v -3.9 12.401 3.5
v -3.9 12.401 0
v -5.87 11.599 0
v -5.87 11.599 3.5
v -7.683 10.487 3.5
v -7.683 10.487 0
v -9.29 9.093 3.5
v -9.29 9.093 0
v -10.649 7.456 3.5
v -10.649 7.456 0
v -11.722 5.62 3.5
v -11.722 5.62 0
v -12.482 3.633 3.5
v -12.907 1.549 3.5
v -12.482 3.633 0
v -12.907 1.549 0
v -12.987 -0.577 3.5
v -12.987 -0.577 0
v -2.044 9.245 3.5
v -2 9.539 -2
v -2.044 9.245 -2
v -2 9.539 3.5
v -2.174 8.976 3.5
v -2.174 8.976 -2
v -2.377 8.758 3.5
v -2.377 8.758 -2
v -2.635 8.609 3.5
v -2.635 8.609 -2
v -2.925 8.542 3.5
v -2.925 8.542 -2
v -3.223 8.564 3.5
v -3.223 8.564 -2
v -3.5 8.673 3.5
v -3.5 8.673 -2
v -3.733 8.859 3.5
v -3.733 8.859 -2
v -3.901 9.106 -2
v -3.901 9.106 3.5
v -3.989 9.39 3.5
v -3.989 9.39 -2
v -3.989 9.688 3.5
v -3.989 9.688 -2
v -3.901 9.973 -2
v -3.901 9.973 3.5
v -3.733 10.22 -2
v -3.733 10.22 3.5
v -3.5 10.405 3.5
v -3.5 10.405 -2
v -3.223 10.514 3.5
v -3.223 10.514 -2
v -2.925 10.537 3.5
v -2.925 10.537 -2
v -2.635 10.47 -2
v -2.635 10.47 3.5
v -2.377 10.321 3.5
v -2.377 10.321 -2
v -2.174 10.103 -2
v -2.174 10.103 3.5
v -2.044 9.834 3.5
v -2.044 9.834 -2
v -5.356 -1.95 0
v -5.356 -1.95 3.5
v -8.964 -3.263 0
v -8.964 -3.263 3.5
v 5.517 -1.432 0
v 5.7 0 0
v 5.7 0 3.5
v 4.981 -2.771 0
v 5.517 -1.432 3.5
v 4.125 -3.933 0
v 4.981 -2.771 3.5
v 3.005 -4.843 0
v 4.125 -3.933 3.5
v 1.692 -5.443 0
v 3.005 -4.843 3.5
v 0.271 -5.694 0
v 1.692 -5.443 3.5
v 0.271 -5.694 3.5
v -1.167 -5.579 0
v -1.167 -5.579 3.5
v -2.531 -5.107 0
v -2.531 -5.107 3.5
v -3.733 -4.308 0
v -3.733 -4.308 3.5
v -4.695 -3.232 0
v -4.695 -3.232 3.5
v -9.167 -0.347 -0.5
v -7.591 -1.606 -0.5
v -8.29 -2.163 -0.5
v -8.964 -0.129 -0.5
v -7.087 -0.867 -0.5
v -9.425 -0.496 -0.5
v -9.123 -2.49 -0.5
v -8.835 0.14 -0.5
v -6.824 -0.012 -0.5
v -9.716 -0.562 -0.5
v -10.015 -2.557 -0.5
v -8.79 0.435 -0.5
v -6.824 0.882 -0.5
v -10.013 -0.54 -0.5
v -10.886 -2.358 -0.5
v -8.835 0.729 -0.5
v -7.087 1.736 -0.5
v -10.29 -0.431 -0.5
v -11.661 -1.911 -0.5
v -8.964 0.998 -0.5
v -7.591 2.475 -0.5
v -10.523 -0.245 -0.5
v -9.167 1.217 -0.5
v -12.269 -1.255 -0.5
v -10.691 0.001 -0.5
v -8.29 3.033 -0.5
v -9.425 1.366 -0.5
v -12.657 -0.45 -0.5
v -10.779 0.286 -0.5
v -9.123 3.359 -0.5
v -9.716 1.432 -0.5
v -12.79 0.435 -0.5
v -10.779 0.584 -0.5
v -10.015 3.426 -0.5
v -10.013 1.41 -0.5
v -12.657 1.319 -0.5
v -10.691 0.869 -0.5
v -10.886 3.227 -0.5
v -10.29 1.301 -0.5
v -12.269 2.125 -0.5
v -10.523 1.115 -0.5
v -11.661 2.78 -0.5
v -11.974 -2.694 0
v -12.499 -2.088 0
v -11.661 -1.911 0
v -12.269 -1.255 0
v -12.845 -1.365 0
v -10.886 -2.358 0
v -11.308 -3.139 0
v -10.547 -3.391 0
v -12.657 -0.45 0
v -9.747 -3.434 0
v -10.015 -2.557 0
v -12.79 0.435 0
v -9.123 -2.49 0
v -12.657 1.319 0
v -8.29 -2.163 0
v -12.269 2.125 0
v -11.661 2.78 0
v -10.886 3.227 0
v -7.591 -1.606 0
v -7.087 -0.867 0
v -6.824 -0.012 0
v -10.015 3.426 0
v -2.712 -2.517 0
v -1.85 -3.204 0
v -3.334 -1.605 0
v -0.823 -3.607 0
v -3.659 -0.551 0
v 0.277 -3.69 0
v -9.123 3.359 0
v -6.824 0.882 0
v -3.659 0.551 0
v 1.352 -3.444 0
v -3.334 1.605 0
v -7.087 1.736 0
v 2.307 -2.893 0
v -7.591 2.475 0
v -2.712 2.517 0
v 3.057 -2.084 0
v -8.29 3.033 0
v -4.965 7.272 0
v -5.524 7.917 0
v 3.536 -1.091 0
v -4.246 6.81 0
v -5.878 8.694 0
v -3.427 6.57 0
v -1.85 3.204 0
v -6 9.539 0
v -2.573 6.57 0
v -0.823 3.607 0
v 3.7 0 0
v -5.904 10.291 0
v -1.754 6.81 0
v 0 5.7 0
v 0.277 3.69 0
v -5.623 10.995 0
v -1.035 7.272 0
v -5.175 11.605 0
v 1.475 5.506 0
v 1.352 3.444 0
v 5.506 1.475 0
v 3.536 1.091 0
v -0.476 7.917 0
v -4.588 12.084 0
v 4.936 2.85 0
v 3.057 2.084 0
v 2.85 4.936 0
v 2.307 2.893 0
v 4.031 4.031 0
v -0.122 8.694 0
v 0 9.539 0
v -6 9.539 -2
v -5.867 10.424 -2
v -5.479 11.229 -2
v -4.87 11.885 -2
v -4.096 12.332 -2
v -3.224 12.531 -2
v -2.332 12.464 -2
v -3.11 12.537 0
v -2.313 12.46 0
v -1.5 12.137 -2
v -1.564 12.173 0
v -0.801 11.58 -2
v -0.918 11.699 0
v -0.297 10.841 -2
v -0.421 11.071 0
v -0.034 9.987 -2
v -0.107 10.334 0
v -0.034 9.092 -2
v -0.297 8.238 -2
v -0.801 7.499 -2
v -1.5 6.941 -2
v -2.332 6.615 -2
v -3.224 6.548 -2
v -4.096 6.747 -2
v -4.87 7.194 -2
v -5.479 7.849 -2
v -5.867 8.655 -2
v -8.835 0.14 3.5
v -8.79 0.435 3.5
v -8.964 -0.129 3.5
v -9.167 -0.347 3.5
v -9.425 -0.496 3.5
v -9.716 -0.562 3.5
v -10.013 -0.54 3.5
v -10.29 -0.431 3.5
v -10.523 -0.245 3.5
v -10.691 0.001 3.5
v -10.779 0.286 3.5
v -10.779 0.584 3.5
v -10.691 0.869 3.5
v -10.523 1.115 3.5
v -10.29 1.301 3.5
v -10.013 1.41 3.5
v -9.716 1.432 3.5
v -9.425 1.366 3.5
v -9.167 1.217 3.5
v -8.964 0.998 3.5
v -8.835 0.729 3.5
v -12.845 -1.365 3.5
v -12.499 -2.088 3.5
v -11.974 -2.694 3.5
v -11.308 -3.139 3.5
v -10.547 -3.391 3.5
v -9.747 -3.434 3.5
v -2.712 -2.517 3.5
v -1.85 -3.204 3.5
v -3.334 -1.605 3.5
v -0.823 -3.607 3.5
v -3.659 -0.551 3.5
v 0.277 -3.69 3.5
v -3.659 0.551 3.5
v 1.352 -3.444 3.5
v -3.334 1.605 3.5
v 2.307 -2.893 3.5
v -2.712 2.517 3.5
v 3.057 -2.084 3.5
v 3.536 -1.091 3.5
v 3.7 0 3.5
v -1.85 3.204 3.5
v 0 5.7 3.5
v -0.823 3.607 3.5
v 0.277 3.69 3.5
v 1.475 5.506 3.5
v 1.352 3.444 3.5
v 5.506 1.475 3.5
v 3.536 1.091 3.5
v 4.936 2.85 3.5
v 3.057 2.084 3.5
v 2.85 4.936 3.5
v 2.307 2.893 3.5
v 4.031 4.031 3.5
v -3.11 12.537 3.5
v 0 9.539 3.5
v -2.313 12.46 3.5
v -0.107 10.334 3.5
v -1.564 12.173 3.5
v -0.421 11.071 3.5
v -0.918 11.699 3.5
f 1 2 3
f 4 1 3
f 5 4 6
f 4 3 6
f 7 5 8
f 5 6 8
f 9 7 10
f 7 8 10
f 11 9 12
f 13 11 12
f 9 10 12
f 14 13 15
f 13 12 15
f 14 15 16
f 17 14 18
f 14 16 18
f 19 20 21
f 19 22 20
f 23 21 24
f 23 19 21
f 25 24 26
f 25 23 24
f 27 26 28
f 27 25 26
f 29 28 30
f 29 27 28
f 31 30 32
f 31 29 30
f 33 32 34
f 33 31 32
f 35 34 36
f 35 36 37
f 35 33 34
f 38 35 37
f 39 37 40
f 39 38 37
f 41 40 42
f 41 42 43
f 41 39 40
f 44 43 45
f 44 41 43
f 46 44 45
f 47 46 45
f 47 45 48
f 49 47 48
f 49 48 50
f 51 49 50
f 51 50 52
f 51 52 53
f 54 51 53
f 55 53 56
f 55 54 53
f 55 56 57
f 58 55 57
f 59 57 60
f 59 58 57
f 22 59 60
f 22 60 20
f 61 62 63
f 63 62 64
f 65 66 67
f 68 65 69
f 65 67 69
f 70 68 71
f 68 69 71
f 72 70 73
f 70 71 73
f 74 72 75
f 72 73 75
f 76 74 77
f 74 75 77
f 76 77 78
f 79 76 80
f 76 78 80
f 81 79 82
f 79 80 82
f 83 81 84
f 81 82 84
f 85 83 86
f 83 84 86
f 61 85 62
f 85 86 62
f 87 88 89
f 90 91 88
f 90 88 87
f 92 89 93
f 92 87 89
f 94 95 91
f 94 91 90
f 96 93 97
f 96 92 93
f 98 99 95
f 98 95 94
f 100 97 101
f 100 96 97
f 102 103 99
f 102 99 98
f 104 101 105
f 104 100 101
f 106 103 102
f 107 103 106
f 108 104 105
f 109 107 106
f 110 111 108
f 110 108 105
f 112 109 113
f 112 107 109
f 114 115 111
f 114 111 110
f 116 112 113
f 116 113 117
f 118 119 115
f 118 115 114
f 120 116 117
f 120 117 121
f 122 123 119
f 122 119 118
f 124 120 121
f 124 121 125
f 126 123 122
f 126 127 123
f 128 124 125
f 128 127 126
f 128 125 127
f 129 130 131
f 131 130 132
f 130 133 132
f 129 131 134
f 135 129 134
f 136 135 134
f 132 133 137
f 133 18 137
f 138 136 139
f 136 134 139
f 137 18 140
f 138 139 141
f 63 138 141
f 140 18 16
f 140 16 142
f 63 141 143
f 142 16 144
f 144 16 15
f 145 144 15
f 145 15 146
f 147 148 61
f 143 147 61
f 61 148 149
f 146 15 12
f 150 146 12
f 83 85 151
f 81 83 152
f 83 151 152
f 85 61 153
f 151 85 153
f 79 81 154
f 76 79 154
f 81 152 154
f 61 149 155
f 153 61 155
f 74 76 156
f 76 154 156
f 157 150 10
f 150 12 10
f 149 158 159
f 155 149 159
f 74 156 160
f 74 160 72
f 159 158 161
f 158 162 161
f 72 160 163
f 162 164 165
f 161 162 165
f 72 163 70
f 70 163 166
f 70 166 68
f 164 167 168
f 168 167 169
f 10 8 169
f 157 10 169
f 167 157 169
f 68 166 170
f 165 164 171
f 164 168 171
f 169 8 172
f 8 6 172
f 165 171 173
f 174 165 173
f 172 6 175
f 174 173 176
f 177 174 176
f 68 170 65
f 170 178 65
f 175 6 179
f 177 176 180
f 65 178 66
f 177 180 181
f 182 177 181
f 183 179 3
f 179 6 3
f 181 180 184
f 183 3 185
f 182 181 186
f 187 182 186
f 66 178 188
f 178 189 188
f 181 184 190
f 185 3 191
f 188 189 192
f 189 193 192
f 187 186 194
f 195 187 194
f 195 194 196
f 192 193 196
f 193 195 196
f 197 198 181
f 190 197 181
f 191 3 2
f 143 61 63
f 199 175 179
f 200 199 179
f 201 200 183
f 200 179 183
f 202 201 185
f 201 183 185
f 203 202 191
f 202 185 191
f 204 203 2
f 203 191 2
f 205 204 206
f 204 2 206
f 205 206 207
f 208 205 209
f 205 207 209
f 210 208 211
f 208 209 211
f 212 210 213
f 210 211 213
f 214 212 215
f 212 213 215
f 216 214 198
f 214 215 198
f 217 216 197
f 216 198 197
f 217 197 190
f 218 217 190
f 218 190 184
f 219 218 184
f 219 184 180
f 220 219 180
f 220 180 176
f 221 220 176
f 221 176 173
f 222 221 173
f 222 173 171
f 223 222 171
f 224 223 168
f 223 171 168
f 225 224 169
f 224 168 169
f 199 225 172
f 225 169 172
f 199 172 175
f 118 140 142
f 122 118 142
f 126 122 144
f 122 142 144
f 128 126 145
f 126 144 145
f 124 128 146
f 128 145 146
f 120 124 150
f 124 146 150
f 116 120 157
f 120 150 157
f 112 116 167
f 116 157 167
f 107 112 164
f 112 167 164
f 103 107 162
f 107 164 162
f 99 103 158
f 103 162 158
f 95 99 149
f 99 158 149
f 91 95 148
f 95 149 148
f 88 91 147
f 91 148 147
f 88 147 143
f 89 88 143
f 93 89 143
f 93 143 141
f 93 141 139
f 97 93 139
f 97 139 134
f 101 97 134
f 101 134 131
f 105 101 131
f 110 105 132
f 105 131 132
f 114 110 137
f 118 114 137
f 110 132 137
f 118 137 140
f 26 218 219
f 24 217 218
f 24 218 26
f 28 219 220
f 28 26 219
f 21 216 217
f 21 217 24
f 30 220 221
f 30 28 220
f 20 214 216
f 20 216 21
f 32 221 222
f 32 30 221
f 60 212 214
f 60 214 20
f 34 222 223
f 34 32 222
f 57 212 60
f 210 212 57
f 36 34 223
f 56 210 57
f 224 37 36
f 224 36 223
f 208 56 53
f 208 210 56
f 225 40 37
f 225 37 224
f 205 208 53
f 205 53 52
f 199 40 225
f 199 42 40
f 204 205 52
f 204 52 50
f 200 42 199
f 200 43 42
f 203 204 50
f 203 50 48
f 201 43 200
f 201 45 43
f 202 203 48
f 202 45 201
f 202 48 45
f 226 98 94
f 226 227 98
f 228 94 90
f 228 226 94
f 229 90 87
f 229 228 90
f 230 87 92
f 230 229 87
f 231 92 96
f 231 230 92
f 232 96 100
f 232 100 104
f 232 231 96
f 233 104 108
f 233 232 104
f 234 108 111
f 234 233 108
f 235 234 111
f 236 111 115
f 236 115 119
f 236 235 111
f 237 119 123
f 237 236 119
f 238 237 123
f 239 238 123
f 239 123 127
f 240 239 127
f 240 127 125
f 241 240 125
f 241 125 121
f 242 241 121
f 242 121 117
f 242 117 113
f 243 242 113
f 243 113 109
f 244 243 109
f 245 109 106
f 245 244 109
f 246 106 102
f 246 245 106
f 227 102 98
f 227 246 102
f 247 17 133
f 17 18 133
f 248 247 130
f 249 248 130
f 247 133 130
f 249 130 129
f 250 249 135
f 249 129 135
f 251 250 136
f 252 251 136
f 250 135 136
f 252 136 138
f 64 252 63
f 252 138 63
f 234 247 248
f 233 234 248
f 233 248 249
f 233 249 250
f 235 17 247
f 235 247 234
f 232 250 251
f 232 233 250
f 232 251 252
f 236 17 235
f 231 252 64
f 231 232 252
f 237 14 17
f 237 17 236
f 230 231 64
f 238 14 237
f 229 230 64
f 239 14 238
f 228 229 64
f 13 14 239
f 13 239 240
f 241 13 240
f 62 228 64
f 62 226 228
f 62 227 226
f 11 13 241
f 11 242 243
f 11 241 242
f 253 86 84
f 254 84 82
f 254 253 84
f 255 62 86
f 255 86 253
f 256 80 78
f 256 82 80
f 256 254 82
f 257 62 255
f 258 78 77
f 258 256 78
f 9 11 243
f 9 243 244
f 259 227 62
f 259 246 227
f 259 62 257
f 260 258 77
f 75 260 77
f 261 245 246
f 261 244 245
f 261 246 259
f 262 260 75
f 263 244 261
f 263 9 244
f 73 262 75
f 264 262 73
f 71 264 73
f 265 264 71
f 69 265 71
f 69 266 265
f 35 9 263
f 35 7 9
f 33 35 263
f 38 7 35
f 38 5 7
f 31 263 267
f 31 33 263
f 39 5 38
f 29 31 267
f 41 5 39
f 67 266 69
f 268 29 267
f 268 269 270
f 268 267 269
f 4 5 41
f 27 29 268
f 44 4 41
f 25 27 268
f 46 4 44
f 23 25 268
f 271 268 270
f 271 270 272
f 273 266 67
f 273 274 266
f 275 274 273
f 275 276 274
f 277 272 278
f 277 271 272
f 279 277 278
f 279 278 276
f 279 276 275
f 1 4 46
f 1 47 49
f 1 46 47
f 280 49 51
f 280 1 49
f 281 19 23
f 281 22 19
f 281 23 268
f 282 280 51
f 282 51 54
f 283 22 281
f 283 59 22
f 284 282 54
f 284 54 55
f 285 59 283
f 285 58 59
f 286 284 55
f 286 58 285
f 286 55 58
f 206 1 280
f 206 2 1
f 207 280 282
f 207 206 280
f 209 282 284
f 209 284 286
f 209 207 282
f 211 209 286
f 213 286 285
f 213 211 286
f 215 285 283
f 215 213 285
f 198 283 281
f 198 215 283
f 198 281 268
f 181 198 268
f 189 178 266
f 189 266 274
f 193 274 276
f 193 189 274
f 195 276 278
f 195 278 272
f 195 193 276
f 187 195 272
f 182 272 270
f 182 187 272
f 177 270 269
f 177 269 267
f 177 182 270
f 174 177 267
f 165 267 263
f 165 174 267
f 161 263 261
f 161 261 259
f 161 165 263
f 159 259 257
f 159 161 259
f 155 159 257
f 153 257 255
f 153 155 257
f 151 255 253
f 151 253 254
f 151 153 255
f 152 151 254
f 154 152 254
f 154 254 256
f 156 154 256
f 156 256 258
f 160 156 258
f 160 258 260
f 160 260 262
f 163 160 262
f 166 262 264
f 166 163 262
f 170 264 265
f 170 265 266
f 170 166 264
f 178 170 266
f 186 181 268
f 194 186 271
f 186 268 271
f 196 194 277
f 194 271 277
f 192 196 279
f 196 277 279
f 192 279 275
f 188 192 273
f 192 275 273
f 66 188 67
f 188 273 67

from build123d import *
from build123d.topology import SkipClean

# Parameters (mm, degrees)
SKETCH1_R           = 13
SKETCH1_R_2         = 3.7
BOSS_EXTRUDE1_DEPTH = 3.5
CUT_EXTRUDE1_START  = -10
CUT_EXTRUDE1_DEPTH  = 10
SKETCH3_R           = 1
CUT_EXTRUDE2_DEPTH  = 10
SKETCH5_R           = 1
CUT_EXTRUDE3_DEPTH  = 6
FILLET1_R           = 3
SKETCH6_R           = 3
SKETCH6_R_2         = 1
BOSS_EXTRUDE2_DEPTH = 0.5
SKETCH6_3_R         = 3
SKETCH6_3_R_2       = 1
BOSS_EXTRUDE3_DEPTH = 2


with BuildPart() as part:
    # Sketch1 → Boss-Extrude1 (new body)
    with BuildSketch(Plane.XY):
        Circle(SKETCH1_R)
        Circle(SKETCH1_R_2, mode=Mode.SUBTRACT)
    extrude(amount=BOSS_EXTRUDE1_DEPTH)

    # Sketch2 → Cut-Extrude1 (cut)
    with BuildSketch(Plane.XY.offset(3.5).offset(CUT_EXTRUDE1_START)):
        with BuildLine():
            ThreePointArc((5.7, 0), (0.989794613, -5.613404192), (-5.356247938, -1.949514817))
            Line((-5.356247938, -1.949514817), (-12.21600407, -4.446261863))
            ThreePointArc((-12.21600407, -4.446261863), (2.25742631, -12.802500789), (13, 0))
            ThreePointArc((13, 0), (9.192388155, 9.192388155), (0, 13))
            Line((0, 13), (0, 5.7))
            ThreePointArc((0, 5.7), (4.030508653, 4.030508653), (5.7, 0))
        make_face()
    extrude(amount=CUT_EXTRUDE1_DEPTH, mode=Mode.SUBTRACT)

    # Sketch3 → Cut-Extrude2 (cut)
    with BuildSketch(Plane.XY.offset(3.5)):
        with Locations((-3, 9.539392014)):
            Circle(SKETCH3_R)
    extrude(amount=-CUT_EXTRUDE2_DEPTH, mode=Mode.SUBTRACT)

    # Sketch5 → Cut-Extrude3 (cut)
    with BuildSketch(Plane.XY.offset(3.5)):
        with Locations((-9.790353578, 0.434714634)):
            Circle(SKETCH5_R)
    extrude(amount=-CUT_EXTRUDE3_DEPTH, mode=Mode.SUBTRACT)

    # Fillet1
    fillet1_edges = [part.edges().sort_by_distance(p)[0] for p in [
        (-12.21600407, -4.446261863, 1.75),
        (0, 13, 1.75),
    ]]
    fillet(fillet1_edges, radius=FILLET1_R)

    # Sketch6 → Boss-Extrude2 (add)
    with SkipClean():  # the faces are left unmerged after this step: merging them gives an invalid solid
        with BuildSketch(Plane(origin=(0, 0, 0), x_dir=(-1, 0, 0), z_dir=(0, 0, -1))):
            with Locations((9.790353578, 0.434714634)):
                Circle(SKETCH6_R)
            with Locations((9.790353578, 0.434714634)):
                Circle(SKETCH6_R_2, mode=Mode.SUBTRACT)
        extrude(amount=BOSS_EXTRUDE2_DEPTH)

    # Sketch6<3> → Boss-Extrude3 (add)
    with SkipClean():  # the faces are left unmerged after this step: merging them gives an invalid solid
        with BuildSketch(Plane(origin=(0, 0, 0), x_dir=(-1, 0, 0), z_dir=(0, 0, -1))):
            with Locations((3, 9.539392014)):
                Circle(SKETCH6_3_R)
            with Locations((3, 9.539392014)):
                Circle(SKETCH6_3_R_2, mode=Mode.SUBTRACT)
        extrude(amount=BOSS_EXTRUDE3_DEPTH)


solid = part.part
